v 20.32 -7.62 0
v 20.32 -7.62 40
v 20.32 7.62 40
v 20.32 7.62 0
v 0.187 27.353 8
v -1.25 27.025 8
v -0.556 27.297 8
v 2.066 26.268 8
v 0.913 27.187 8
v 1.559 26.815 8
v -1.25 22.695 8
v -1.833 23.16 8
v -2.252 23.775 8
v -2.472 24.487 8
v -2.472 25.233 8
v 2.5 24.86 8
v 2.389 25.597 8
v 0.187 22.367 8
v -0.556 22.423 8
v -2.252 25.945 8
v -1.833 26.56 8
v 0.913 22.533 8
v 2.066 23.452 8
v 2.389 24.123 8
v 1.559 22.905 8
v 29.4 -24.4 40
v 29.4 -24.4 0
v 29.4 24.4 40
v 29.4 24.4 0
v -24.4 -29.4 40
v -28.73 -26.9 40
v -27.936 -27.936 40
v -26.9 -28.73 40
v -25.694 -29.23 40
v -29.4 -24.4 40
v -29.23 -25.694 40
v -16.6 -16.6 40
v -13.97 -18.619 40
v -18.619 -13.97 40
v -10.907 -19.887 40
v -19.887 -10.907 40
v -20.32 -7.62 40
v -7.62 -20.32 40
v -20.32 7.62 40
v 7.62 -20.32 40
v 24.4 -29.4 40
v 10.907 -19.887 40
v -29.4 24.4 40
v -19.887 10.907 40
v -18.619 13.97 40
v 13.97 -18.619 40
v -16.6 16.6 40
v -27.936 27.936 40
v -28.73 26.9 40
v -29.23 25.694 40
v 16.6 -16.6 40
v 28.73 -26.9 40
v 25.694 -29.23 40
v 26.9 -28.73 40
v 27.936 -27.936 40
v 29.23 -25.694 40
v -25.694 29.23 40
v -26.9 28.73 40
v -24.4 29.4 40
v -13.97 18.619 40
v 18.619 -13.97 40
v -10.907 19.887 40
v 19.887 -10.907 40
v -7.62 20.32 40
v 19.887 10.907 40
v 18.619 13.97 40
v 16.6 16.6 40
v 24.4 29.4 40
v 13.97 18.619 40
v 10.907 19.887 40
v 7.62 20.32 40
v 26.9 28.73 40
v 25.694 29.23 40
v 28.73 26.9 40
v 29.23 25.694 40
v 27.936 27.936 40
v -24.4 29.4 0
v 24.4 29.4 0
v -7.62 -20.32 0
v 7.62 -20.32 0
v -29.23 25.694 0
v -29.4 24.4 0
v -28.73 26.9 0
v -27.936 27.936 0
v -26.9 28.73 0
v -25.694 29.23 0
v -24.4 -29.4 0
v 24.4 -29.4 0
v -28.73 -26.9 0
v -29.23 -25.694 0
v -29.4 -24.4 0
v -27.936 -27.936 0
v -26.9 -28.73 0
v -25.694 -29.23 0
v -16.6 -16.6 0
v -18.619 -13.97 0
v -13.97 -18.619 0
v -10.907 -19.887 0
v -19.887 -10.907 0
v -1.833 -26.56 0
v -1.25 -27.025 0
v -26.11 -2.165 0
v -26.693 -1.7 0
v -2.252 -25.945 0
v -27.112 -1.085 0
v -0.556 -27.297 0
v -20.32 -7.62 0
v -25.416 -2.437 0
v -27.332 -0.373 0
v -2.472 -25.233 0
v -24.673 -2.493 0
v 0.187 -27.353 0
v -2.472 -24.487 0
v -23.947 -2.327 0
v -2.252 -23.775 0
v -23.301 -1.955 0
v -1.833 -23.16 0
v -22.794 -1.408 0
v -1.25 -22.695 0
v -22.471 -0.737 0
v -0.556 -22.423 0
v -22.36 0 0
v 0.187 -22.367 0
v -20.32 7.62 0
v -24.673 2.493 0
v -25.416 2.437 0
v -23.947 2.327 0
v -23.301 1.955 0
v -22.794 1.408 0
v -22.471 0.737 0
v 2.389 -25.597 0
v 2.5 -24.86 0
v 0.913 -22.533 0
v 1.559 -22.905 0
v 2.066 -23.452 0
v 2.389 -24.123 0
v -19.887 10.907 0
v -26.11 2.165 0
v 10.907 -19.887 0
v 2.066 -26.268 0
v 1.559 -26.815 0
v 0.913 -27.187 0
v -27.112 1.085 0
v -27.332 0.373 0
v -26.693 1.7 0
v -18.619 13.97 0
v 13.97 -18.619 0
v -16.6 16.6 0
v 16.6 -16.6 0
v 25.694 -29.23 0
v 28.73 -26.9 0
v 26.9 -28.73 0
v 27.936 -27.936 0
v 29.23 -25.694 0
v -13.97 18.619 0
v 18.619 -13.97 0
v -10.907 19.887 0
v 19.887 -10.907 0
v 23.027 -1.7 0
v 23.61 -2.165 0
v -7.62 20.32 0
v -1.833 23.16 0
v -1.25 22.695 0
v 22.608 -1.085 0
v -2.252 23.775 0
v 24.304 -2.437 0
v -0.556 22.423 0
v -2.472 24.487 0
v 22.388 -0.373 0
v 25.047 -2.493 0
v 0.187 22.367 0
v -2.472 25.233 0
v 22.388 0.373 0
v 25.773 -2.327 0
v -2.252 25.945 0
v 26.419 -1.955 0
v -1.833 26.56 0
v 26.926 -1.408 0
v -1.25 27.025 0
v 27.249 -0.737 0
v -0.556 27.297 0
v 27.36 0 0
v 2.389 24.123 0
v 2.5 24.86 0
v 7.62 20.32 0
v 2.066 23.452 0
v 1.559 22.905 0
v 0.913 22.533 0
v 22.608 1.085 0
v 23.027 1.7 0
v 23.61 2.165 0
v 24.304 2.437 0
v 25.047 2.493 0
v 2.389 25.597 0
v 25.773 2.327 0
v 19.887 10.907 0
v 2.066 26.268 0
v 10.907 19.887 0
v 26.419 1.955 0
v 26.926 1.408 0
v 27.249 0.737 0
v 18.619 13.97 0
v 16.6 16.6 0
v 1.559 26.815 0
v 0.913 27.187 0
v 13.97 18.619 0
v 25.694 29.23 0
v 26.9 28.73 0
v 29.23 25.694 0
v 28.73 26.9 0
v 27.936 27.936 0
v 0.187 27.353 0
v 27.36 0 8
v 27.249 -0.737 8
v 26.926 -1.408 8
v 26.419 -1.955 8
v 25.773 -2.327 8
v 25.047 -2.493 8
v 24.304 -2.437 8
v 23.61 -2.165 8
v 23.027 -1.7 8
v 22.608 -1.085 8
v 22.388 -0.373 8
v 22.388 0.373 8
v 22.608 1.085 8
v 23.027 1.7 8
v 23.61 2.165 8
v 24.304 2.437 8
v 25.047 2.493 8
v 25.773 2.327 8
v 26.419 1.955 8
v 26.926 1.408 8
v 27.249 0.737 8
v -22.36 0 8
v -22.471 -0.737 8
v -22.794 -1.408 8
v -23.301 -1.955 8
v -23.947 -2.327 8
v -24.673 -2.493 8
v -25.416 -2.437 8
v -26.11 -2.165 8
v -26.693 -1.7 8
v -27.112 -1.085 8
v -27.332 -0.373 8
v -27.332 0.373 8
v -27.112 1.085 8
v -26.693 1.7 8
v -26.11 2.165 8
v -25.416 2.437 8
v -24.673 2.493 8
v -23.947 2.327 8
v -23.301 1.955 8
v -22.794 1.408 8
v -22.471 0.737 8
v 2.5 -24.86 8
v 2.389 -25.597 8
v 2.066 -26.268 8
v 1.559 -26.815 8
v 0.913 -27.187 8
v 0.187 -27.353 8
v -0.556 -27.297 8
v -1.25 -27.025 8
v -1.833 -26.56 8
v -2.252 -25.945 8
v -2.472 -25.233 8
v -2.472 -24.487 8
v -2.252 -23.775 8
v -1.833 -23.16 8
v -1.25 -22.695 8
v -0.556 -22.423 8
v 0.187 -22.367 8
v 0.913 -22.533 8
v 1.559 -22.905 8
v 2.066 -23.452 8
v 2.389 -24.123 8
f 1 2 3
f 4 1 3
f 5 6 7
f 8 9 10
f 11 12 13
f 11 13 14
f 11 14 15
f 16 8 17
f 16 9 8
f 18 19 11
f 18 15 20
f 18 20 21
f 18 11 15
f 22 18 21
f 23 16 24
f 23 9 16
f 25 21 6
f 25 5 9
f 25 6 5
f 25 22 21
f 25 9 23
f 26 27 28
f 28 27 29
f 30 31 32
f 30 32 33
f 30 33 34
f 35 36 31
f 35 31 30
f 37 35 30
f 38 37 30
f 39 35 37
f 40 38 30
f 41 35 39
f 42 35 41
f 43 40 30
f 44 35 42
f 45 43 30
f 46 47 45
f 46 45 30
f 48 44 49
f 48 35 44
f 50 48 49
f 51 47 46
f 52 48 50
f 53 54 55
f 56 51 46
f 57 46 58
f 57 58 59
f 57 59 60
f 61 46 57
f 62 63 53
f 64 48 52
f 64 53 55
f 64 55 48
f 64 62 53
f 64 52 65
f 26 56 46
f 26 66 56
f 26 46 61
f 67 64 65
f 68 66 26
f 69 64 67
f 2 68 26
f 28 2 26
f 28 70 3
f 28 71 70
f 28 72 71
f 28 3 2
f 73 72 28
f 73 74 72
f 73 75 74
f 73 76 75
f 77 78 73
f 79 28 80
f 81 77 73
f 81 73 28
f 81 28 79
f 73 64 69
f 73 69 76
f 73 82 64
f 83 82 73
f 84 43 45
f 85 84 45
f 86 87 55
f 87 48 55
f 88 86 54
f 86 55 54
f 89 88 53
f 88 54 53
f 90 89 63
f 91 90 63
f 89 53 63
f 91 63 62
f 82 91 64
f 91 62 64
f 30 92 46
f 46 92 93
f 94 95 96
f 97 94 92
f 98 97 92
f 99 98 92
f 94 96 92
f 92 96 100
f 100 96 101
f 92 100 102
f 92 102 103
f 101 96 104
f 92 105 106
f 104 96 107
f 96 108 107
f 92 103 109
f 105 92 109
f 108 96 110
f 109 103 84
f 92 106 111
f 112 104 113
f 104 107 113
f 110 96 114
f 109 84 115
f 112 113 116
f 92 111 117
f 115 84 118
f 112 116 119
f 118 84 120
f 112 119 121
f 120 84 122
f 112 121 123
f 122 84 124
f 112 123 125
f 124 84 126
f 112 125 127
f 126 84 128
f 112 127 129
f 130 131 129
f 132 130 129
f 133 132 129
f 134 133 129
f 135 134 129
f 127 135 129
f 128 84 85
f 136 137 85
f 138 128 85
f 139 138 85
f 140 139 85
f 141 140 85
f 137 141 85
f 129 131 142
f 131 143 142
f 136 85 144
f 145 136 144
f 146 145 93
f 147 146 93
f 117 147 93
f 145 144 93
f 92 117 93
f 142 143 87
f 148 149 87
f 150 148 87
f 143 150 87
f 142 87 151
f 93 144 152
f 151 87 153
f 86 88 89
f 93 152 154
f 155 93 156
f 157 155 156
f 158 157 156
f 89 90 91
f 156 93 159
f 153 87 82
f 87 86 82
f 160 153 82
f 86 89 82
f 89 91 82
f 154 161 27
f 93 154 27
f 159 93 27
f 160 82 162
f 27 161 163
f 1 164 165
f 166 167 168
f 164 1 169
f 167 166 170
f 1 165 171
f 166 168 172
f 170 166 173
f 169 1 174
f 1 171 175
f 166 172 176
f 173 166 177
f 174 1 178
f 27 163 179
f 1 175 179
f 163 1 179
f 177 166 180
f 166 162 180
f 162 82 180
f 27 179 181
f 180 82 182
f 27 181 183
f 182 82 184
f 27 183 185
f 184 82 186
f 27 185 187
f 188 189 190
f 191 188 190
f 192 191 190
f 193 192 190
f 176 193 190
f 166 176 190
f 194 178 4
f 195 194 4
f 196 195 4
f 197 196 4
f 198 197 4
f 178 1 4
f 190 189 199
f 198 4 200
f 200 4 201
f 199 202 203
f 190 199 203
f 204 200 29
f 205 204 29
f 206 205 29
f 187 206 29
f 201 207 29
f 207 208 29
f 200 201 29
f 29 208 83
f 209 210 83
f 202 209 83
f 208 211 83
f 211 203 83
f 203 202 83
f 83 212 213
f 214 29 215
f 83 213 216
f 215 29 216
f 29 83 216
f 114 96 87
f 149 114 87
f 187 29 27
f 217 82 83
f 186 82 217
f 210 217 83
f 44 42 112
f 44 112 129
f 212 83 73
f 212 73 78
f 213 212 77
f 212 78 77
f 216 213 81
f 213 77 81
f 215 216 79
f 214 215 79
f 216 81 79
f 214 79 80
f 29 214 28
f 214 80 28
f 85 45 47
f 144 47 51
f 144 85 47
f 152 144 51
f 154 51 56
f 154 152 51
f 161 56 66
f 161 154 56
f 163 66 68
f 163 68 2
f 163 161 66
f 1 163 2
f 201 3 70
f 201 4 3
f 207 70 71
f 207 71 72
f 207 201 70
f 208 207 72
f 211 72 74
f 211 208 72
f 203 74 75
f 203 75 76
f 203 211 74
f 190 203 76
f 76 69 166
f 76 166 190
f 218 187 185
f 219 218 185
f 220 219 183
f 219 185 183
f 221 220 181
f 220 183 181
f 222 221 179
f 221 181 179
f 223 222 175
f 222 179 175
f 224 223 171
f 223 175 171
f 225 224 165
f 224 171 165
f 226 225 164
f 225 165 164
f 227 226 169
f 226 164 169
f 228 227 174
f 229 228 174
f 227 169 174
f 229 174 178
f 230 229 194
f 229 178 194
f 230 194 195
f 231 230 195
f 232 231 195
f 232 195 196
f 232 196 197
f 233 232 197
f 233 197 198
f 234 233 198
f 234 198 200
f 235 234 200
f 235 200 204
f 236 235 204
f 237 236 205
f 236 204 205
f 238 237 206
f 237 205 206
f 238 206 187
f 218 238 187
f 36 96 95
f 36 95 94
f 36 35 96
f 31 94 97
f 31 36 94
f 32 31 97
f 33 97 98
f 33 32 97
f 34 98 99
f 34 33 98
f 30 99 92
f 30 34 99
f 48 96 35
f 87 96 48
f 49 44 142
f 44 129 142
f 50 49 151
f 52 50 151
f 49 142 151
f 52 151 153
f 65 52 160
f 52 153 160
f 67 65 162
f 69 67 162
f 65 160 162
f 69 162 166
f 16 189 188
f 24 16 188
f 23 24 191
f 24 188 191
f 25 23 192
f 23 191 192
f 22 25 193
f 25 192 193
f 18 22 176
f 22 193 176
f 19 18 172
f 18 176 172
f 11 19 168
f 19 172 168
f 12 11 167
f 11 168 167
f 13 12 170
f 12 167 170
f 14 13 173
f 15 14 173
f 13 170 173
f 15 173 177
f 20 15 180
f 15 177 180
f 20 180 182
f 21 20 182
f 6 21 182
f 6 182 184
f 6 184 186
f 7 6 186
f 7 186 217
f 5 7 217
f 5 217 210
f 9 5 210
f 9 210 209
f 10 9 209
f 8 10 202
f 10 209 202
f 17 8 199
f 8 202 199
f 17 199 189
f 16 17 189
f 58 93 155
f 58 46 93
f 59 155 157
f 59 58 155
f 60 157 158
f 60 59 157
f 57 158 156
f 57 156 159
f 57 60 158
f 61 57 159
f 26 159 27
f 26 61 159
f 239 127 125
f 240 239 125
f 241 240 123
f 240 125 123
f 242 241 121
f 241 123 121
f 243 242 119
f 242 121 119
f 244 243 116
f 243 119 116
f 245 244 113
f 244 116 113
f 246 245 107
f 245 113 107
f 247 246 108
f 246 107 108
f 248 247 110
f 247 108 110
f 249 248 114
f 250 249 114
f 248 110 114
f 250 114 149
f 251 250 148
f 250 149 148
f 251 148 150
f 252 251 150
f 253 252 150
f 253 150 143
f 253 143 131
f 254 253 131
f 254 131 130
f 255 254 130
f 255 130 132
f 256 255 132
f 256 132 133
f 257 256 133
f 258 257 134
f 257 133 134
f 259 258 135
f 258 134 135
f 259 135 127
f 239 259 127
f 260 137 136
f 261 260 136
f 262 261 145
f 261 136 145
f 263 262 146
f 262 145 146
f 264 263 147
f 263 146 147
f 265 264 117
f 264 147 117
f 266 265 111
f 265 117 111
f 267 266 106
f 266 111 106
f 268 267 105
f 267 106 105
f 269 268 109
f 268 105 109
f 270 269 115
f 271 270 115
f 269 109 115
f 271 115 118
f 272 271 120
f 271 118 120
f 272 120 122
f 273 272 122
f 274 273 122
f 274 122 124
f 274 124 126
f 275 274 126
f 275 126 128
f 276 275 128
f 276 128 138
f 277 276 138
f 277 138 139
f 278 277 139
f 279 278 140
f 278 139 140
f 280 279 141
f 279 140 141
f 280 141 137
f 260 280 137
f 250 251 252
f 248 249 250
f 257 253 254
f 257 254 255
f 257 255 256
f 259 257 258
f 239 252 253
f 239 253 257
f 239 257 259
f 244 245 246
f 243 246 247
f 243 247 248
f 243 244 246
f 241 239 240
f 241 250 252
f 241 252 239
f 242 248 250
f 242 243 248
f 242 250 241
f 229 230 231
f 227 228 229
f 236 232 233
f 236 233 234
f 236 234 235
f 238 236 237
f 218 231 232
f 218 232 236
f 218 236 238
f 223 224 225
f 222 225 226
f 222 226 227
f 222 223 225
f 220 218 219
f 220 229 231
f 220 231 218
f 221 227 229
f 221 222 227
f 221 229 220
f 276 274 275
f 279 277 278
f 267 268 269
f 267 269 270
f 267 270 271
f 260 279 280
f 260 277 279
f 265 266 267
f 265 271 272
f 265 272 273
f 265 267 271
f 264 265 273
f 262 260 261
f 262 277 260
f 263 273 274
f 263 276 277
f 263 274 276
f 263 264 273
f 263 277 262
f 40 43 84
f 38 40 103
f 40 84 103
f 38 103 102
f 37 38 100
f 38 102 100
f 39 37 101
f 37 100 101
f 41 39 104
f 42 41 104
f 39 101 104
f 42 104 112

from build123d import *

# Parameters (mm, degrees)
F0_W     = 58.8
F0_H     = 58.8
F1_DEPTH = 40
F2_W     = 40.64
F2_H     = 40.64
F3_DEPTH = 40.001
F4_R     = 2.5
F5_DEPTH = 8
F6_R     = 12.7
F7_R     = 5


with BuildPart() as f1:
    # F0 (on Top) → F1 (new body)
    with BuildSketch(Plane.XY):
        Rectangle(F0_W, F0_H)
    extrude(amount=F1_DEPTH)

    # F2 (on face) → F3 (cut, through all)
    with BuildSketch(Plane.XY.offset(40)):
        Rectangle(F2_W, F2_H)
    extrude(amount=-F3_DEPTH, mode=Mode.SUBTRACT)

    # F4 (on face) → F5 (cut)
    with BuildSketch(Plane(origin=(0, 0, 0), x_dir=(1, 0, 0), z_dir=(0, 0, -1))):
        with Locations((-24.86, 0)):
            Circle(F4_R)
        with Locations((0, 24.86)):
            Circle(F4_R)
        with Locations((24.86, 0)):
            Circle(F4_R)
        with Locations((0, -24.86)):
            Circle(F4_R)
    extrude(amount=-F5_DEPTH, mode=Mode.SUBTRACT)

    # F6
    f6_edges = [f1.edges().sort_by_distance(p)[0] for p in [
        (-20.32, 20.32, 20),
        (20.32, 20.32, 20),
        (20.32, -20.32, 20),
        (-20.32, -20.32, 20),
    ]]
    fillet(f6_edges, radius=F6_R)

    # F7
    f7_edges = [f1.edges().sort_by_distance(p)[0] for p in [
        (-29.4, -29.4, 20),
        (-29.4, 29.4, 20),
        (29.4, -29.4, 20),
        (29.4, 29.4, 20),
    ]]
    fillet(f7_edges, radius=F7_R)


solid = f1.part
